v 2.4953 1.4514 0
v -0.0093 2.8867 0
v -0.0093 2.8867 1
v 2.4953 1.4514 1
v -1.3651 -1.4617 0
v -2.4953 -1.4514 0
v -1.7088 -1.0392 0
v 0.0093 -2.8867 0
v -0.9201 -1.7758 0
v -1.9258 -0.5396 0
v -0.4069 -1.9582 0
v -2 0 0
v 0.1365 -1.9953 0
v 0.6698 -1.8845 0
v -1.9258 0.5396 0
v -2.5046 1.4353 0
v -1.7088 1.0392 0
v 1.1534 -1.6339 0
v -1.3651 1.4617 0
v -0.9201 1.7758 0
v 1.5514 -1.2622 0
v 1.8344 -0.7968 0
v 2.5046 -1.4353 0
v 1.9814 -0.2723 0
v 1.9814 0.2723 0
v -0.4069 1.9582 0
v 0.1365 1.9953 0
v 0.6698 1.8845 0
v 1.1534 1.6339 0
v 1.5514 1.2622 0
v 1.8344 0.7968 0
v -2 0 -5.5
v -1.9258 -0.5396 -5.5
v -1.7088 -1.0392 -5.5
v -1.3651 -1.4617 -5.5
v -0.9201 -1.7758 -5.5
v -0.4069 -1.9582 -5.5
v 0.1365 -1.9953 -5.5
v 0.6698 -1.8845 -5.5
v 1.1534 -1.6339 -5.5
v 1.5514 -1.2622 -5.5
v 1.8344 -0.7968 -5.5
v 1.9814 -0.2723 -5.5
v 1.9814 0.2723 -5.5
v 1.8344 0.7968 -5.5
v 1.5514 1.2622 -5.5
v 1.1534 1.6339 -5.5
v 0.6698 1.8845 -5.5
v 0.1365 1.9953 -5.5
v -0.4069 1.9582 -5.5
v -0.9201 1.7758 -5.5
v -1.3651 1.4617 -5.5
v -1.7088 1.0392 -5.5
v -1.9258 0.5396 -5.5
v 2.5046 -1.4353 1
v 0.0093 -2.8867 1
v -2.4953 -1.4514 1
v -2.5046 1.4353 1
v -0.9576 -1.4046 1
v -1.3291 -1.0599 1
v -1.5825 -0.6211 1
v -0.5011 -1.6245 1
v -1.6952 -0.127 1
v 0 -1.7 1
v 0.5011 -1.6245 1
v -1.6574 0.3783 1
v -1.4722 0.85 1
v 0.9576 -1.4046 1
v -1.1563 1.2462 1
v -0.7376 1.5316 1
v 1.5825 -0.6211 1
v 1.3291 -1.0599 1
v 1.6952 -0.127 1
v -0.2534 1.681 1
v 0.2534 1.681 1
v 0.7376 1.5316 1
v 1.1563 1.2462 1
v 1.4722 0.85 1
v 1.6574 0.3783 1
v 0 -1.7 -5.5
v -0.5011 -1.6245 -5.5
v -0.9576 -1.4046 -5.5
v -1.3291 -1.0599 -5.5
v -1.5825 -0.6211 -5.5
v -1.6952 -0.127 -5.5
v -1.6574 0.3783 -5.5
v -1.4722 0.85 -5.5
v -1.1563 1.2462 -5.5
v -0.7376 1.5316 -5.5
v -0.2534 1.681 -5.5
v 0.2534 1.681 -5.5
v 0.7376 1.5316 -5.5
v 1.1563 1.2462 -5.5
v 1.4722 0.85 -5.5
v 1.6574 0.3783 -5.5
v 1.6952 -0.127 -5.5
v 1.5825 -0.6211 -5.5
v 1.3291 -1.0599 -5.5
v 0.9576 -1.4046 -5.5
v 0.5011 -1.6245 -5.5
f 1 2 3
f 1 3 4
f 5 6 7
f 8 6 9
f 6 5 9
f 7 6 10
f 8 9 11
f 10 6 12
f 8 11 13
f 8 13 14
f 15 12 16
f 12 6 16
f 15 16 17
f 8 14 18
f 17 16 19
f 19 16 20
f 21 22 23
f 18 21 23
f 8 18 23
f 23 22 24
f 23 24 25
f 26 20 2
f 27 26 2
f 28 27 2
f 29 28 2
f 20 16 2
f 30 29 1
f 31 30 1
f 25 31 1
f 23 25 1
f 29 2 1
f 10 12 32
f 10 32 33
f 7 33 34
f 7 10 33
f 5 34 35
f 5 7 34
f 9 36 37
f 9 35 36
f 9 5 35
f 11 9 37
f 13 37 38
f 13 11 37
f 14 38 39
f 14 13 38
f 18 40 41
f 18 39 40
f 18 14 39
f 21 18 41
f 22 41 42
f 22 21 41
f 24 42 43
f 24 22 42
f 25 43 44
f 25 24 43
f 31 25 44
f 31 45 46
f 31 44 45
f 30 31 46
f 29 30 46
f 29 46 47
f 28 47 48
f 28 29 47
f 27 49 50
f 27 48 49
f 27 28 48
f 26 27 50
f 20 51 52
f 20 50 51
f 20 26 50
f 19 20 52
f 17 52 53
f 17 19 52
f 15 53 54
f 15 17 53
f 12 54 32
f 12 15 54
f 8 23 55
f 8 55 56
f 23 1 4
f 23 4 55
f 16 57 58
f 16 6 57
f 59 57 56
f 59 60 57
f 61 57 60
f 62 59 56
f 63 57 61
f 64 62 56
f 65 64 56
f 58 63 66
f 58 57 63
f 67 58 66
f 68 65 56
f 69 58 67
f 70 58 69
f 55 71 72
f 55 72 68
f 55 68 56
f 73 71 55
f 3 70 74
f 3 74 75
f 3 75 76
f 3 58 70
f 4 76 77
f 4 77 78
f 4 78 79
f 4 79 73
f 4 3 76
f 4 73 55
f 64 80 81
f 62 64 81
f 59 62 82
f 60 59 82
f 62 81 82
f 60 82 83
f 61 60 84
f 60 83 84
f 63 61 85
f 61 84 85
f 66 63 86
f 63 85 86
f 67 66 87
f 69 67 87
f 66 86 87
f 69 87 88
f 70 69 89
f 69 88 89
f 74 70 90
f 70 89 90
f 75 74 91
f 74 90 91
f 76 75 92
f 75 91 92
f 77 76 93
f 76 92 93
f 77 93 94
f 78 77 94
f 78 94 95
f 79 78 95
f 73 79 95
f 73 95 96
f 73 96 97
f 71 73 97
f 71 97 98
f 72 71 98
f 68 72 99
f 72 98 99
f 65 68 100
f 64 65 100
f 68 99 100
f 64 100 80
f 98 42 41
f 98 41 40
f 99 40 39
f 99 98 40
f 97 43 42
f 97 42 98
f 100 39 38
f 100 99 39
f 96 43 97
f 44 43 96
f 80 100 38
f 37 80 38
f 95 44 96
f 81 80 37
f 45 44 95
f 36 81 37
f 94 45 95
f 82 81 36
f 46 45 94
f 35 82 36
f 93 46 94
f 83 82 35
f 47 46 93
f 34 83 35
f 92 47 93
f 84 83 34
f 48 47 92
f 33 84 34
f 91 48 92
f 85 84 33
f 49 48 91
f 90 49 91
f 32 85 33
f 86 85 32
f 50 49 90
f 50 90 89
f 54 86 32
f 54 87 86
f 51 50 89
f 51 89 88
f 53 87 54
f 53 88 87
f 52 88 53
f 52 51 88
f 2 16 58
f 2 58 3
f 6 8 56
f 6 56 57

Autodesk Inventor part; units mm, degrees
ref_plane "YZ Plane" through (0, 0, 0) normal (1, 0, 0) x (0, 1, 0)
ref_plane "XZ Plane" through (0, 0, 0) normal (0, 1, 0) x (-1, 0, 0)
ref_plane "XY Plane" through (0, 0, 0) normal (0, 0, 1) x (1, 0, 0)
sketch "Skizze4" plane through (0, 0, 0) normal (0, 0, 1) x (1, 0, 0)
  line L0 (2.5046, -1.4353) -> (0.0093, -2.8867)
  line L1 (0.0093, -2.8867) -> (-2.4953, -1.4514)
  line L2 (-2.4953, -1.4514) -> (-2.5046, 1.4353)
  line L3 (-2.5046, 1.4353) -> (-0.0093, 2.8867)
  line L4 (-0.0093, 2.8867) -> (2.4953, 1.4514)
  line L5 (2.4953, 1.4514) -> (2.5046, -1.4353)
  point P0 (0, 0)
  point P1 (0, 0)
  dimension "d21" = 5
extrude "Extrusion1" add sketch "Skizze4" along normal blind 1
sketch "Skizze5" plane through (0, 0, 0) normal (0, 0, -1) x (-1, 0, 0)
  circle A0 centre (0, 0) radius 2
  dimension "d7" = 4
extrude "Extrusion2" add sketch "Skizze5" along normal blind 5.5
sketch "Skizze6" plane through (0, 0, 1) normal (0, 0, 1) x (1, 0, 0)
  point P0 (0, 0)
hole "Bohrung1" at (0, 0, 1) direction (0, 0, -1) diameter 3.4 depth 10.65 tip angle 118 clearance for "Flachkopfmaschinenschraube" size "M3" standard "ANSI Metrisches M Profil"
thread "Gewinde2" size "M3x0.5" class "6H" standard "ANSI Metric M Profile" full length
properties part number "huelse_M3"
